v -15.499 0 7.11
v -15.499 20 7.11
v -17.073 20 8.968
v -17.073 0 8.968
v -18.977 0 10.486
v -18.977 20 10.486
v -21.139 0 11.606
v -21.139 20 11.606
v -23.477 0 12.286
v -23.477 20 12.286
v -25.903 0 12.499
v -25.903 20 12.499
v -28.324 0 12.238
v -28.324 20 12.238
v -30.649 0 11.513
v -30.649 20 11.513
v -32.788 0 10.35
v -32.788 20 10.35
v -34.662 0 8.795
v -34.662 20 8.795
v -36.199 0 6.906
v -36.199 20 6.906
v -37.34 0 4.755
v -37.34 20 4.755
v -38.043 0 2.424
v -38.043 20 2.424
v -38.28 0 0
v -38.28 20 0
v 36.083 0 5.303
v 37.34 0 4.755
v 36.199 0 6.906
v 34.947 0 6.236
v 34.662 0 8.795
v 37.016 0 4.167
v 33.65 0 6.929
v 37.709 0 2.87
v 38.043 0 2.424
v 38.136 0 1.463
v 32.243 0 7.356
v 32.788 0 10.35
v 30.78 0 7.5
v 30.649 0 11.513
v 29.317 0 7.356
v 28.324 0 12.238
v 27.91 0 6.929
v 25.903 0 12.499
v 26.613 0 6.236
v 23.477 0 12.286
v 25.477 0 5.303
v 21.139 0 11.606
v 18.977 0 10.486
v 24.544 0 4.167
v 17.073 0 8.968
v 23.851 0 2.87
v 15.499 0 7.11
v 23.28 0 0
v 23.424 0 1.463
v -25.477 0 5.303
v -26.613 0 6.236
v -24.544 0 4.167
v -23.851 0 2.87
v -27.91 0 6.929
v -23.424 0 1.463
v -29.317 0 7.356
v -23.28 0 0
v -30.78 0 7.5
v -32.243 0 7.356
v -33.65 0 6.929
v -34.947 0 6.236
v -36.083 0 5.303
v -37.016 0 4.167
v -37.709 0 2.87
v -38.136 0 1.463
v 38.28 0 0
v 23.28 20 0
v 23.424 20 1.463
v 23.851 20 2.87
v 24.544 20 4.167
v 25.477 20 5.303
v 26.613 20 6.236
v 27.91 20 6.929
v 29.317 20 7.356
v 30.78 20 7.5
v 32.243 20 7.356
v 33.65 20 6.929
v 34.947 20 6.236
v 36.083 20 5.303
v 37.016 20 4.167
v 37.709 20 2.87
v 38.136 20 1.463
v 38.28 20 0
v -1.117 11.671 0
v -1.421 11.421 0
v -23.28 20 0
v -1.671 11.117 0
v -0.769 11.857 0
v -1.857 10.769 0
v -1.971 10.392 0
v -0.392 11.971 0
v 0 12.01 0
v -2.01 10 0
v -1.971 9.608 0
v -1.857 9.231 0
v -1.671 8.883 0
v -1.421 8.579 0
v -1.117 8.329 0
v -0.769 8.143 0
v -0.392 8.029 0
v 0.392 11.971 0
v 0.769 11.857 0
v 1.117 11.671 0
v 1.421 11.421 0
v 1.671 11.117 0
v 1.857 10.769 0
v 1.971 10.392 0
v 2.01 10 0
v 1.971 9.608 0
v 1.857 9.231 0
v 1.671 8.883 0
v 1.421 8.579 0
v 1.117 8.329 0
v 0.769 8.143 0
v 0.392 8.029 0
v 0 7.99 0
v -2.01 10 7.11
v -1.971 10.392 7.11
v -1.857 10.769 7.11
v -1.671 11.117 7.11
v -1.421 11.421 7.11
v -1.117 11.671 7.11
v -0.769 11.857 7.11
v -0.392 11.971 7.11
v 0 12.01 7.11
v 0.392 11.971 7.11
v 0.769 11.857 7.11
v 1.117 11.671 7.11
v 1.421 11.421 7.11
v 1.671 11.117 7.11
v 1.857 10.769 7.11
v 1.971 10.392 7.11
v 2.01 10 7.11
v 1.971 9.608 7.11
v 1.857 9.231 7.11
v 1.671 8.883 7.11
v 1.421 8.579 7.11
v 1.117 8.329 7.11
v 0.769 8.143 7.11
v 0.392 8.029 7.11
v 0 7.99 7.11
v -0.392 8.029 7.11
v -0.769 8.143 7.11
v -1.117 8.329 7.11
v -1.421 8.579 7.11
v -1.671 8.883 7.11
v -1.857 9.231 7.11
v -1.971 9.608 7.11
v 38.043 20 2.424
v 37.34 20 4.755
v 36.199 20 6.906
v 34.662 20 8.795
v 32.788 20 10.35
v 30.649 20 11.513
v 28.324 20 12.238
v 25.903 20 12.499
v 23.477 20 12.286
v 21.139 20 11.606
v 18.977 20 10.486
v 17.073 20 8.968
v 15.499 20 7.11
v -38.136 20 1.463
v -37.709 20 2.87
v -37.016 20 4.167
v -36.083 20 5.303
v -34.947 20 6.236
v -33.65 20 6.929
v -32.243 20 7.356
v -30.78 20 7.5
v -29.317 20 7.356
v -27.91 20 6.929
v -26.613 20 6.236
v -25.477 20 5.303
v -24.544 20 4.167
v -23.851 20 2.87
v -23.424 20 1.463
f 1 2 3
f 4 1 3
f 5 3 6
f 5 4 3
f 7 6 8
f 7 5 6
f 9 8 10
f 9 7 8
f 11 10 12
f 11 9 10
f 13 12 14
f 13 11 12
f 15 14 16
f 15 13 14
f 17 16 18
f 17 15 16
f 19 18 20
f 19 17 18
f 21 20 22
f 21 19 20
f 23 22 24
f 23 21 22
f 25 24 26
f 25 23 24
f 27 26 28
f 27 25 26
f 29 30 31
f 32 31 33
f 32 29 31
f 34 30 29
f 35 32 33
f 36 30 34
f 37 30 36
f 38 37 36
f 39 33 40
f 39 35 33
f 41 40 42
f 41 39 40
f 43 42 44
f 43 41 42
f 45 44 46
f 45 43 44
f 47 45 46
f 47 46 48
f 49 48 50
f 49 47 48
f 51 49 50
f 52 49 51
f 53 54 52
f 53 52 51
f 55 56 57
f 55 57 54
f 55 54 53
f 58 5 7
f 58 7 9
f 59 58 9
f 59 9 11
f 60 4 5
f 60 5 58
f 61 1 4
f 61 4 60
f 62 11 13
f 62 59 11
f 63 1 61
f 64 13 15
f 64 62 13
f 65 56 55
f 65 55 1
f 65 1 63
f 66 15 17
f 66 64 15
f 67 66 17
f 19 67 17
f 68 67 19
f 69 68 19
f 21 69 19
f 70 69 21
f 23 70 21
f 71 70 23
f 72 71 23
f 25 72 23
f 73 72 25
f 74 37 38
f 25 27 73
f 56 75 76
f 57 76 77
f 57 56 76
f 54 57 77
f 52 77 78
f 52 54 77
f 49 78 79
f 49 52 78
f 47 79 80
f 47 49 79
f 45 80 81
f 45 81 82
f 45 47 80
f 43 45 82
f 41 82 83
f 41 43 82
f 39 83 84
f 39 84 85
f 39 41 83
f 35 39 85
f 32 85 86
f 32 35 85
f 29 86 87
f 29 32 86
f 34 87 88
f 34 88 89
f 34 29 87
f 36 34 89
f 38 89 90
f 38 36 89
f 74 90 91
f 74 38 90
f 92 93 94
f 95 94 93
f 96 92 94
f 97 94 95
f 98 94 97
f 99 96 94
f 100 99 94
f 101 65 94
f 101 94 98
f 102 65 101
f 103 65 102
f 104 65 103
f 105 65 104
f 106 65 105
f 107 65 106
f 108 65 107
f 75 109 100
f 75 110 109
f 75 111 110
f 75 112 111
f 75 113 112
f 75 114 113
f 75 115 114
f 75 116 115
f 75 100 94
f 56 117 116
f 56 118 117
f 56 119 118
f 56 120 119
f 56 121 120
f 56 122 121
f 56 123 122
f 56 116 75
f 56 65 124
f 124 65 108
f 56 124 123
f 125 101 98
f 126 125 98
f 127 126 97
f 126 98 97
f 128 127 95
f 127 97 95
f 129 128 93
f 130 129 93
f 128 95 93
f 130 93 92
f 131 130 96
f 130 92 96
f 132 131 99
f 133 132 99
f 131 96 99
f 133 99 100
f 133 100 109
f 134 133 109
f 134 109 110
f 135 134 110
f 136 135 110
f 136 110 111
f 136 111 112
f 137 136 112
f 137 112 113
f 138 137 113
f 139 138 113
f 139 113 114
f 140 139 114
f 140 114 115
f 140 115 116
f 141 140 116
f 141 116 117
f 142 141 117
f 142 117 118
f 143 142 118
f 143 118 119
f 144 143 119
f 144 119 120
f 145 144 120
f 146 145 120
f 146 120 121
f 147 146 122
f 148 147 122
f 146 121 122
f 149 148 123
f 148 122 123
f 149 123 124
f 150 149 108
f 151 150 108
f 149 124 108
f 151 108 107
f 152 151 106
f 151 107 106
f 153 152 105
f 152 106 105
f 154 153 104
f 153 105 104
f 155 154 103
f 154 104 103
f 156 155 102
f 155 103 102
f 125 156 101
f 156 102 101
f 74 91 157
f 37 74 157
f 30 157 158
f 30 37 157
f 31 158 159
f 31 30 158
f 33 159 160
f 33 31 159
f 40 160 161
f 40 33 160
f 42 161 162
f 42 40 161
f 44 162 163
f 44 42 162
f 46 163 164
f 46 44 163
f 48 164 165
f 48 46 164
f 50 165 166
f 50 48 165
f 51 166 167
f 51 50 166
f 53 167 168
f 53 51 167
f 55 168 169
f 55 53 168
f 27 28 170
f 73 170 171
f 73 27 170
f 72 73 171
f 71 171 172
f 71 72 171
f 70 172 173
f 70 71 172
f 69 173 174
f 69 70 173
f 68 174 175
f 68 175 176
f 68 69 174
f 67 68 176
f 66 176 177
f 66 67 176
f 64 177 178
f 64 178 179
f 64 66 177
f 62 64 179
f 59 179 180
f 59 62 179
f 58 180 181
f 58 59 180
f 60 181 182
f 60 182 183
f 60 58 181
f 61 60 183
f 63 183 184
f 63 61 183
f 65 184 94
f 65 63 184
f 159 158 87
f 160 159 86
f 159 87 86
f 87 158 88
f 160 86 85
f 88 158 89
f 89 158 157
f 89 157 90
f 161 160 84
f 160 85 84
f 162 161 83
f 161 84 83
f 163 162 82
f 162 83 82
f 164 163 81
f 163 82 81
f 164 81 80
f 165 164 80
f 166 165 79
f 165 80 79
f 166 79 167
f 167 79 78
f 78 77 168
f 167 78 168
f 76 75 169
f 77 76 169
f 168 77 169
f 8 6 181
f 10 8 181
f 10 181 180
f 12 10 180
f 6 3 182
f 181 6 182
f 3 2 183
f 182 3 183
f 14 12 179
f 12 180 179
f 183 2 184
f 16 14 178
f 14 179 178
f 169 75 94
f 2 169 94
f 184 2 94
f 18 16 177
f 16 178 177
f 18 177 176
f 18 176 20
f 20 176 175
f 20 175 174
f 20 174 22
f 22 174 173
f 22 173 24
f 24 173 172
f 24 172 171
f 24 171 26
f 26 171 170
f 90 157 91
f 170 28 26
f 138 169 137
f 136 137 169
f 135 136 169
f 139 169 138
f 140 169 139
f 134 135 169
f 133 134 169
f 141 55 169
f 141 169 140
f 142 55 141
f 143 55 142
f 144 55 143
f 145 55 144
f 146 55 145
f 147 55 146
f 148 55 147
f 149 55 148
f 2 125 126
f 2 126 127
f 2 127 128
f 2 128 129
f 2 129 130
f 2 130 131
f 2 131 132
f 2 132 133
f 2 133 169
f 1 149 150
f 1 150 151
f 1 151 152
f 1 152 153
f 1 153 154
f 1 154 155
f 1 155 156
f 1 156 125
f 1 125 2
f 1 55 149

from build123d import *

# Parameters (mm, degrees)
BOSS_EXTRUDE1_DEPTH = 20
SKETCH2_R           = 2.01
CUT_EXTRUDE1_DEPTH  = 20


with BuildPart() as part:
    # Sketch1 → Boss-Extrude1 (new body)
    with BuildSketch(Plane(origin=(0, 0, 0), x_dir=(1, 0, 0), z_dir=(0, 1, 0))):
        with BuildLine():
            Line((-23.28, 0), (23.28, 0))
            ThreePointArc((23.28, 0), (30.78, -7.5), (38.28, 0))
            ThreePointArc((38.28, 0), (29.504120366, -11.932347946), (15.4990516, -7.11))
            Line((15.4990516, -7.11), (-15.4990516, -7.11))
            ThreePointArc((-15.4990516, -7.11), (-29.504120366, -11.932347946), (-38.28, 0))
            ThreePointArc((-38.28, 0), (-30.78, -7.5), (-23.28, 0))
        make_face()
    extrude(amount=BOSS_EXTRUDE1_DEPTH)

    # Sketch2 → Cut-Extrude1 (cut)
    with BuildSketch(Plane(origin=(0, 0, 0), x_dir=(-1, 0, 0), z_dir=(0, 0, -1))):
        with Locations((0, 10)):
            Circle(SKETCH2_R)
    extrude(amount=-CUT_EXTRUDE1_DEPTH, mode=Mode.SUBTRACT)


solid = part.part
